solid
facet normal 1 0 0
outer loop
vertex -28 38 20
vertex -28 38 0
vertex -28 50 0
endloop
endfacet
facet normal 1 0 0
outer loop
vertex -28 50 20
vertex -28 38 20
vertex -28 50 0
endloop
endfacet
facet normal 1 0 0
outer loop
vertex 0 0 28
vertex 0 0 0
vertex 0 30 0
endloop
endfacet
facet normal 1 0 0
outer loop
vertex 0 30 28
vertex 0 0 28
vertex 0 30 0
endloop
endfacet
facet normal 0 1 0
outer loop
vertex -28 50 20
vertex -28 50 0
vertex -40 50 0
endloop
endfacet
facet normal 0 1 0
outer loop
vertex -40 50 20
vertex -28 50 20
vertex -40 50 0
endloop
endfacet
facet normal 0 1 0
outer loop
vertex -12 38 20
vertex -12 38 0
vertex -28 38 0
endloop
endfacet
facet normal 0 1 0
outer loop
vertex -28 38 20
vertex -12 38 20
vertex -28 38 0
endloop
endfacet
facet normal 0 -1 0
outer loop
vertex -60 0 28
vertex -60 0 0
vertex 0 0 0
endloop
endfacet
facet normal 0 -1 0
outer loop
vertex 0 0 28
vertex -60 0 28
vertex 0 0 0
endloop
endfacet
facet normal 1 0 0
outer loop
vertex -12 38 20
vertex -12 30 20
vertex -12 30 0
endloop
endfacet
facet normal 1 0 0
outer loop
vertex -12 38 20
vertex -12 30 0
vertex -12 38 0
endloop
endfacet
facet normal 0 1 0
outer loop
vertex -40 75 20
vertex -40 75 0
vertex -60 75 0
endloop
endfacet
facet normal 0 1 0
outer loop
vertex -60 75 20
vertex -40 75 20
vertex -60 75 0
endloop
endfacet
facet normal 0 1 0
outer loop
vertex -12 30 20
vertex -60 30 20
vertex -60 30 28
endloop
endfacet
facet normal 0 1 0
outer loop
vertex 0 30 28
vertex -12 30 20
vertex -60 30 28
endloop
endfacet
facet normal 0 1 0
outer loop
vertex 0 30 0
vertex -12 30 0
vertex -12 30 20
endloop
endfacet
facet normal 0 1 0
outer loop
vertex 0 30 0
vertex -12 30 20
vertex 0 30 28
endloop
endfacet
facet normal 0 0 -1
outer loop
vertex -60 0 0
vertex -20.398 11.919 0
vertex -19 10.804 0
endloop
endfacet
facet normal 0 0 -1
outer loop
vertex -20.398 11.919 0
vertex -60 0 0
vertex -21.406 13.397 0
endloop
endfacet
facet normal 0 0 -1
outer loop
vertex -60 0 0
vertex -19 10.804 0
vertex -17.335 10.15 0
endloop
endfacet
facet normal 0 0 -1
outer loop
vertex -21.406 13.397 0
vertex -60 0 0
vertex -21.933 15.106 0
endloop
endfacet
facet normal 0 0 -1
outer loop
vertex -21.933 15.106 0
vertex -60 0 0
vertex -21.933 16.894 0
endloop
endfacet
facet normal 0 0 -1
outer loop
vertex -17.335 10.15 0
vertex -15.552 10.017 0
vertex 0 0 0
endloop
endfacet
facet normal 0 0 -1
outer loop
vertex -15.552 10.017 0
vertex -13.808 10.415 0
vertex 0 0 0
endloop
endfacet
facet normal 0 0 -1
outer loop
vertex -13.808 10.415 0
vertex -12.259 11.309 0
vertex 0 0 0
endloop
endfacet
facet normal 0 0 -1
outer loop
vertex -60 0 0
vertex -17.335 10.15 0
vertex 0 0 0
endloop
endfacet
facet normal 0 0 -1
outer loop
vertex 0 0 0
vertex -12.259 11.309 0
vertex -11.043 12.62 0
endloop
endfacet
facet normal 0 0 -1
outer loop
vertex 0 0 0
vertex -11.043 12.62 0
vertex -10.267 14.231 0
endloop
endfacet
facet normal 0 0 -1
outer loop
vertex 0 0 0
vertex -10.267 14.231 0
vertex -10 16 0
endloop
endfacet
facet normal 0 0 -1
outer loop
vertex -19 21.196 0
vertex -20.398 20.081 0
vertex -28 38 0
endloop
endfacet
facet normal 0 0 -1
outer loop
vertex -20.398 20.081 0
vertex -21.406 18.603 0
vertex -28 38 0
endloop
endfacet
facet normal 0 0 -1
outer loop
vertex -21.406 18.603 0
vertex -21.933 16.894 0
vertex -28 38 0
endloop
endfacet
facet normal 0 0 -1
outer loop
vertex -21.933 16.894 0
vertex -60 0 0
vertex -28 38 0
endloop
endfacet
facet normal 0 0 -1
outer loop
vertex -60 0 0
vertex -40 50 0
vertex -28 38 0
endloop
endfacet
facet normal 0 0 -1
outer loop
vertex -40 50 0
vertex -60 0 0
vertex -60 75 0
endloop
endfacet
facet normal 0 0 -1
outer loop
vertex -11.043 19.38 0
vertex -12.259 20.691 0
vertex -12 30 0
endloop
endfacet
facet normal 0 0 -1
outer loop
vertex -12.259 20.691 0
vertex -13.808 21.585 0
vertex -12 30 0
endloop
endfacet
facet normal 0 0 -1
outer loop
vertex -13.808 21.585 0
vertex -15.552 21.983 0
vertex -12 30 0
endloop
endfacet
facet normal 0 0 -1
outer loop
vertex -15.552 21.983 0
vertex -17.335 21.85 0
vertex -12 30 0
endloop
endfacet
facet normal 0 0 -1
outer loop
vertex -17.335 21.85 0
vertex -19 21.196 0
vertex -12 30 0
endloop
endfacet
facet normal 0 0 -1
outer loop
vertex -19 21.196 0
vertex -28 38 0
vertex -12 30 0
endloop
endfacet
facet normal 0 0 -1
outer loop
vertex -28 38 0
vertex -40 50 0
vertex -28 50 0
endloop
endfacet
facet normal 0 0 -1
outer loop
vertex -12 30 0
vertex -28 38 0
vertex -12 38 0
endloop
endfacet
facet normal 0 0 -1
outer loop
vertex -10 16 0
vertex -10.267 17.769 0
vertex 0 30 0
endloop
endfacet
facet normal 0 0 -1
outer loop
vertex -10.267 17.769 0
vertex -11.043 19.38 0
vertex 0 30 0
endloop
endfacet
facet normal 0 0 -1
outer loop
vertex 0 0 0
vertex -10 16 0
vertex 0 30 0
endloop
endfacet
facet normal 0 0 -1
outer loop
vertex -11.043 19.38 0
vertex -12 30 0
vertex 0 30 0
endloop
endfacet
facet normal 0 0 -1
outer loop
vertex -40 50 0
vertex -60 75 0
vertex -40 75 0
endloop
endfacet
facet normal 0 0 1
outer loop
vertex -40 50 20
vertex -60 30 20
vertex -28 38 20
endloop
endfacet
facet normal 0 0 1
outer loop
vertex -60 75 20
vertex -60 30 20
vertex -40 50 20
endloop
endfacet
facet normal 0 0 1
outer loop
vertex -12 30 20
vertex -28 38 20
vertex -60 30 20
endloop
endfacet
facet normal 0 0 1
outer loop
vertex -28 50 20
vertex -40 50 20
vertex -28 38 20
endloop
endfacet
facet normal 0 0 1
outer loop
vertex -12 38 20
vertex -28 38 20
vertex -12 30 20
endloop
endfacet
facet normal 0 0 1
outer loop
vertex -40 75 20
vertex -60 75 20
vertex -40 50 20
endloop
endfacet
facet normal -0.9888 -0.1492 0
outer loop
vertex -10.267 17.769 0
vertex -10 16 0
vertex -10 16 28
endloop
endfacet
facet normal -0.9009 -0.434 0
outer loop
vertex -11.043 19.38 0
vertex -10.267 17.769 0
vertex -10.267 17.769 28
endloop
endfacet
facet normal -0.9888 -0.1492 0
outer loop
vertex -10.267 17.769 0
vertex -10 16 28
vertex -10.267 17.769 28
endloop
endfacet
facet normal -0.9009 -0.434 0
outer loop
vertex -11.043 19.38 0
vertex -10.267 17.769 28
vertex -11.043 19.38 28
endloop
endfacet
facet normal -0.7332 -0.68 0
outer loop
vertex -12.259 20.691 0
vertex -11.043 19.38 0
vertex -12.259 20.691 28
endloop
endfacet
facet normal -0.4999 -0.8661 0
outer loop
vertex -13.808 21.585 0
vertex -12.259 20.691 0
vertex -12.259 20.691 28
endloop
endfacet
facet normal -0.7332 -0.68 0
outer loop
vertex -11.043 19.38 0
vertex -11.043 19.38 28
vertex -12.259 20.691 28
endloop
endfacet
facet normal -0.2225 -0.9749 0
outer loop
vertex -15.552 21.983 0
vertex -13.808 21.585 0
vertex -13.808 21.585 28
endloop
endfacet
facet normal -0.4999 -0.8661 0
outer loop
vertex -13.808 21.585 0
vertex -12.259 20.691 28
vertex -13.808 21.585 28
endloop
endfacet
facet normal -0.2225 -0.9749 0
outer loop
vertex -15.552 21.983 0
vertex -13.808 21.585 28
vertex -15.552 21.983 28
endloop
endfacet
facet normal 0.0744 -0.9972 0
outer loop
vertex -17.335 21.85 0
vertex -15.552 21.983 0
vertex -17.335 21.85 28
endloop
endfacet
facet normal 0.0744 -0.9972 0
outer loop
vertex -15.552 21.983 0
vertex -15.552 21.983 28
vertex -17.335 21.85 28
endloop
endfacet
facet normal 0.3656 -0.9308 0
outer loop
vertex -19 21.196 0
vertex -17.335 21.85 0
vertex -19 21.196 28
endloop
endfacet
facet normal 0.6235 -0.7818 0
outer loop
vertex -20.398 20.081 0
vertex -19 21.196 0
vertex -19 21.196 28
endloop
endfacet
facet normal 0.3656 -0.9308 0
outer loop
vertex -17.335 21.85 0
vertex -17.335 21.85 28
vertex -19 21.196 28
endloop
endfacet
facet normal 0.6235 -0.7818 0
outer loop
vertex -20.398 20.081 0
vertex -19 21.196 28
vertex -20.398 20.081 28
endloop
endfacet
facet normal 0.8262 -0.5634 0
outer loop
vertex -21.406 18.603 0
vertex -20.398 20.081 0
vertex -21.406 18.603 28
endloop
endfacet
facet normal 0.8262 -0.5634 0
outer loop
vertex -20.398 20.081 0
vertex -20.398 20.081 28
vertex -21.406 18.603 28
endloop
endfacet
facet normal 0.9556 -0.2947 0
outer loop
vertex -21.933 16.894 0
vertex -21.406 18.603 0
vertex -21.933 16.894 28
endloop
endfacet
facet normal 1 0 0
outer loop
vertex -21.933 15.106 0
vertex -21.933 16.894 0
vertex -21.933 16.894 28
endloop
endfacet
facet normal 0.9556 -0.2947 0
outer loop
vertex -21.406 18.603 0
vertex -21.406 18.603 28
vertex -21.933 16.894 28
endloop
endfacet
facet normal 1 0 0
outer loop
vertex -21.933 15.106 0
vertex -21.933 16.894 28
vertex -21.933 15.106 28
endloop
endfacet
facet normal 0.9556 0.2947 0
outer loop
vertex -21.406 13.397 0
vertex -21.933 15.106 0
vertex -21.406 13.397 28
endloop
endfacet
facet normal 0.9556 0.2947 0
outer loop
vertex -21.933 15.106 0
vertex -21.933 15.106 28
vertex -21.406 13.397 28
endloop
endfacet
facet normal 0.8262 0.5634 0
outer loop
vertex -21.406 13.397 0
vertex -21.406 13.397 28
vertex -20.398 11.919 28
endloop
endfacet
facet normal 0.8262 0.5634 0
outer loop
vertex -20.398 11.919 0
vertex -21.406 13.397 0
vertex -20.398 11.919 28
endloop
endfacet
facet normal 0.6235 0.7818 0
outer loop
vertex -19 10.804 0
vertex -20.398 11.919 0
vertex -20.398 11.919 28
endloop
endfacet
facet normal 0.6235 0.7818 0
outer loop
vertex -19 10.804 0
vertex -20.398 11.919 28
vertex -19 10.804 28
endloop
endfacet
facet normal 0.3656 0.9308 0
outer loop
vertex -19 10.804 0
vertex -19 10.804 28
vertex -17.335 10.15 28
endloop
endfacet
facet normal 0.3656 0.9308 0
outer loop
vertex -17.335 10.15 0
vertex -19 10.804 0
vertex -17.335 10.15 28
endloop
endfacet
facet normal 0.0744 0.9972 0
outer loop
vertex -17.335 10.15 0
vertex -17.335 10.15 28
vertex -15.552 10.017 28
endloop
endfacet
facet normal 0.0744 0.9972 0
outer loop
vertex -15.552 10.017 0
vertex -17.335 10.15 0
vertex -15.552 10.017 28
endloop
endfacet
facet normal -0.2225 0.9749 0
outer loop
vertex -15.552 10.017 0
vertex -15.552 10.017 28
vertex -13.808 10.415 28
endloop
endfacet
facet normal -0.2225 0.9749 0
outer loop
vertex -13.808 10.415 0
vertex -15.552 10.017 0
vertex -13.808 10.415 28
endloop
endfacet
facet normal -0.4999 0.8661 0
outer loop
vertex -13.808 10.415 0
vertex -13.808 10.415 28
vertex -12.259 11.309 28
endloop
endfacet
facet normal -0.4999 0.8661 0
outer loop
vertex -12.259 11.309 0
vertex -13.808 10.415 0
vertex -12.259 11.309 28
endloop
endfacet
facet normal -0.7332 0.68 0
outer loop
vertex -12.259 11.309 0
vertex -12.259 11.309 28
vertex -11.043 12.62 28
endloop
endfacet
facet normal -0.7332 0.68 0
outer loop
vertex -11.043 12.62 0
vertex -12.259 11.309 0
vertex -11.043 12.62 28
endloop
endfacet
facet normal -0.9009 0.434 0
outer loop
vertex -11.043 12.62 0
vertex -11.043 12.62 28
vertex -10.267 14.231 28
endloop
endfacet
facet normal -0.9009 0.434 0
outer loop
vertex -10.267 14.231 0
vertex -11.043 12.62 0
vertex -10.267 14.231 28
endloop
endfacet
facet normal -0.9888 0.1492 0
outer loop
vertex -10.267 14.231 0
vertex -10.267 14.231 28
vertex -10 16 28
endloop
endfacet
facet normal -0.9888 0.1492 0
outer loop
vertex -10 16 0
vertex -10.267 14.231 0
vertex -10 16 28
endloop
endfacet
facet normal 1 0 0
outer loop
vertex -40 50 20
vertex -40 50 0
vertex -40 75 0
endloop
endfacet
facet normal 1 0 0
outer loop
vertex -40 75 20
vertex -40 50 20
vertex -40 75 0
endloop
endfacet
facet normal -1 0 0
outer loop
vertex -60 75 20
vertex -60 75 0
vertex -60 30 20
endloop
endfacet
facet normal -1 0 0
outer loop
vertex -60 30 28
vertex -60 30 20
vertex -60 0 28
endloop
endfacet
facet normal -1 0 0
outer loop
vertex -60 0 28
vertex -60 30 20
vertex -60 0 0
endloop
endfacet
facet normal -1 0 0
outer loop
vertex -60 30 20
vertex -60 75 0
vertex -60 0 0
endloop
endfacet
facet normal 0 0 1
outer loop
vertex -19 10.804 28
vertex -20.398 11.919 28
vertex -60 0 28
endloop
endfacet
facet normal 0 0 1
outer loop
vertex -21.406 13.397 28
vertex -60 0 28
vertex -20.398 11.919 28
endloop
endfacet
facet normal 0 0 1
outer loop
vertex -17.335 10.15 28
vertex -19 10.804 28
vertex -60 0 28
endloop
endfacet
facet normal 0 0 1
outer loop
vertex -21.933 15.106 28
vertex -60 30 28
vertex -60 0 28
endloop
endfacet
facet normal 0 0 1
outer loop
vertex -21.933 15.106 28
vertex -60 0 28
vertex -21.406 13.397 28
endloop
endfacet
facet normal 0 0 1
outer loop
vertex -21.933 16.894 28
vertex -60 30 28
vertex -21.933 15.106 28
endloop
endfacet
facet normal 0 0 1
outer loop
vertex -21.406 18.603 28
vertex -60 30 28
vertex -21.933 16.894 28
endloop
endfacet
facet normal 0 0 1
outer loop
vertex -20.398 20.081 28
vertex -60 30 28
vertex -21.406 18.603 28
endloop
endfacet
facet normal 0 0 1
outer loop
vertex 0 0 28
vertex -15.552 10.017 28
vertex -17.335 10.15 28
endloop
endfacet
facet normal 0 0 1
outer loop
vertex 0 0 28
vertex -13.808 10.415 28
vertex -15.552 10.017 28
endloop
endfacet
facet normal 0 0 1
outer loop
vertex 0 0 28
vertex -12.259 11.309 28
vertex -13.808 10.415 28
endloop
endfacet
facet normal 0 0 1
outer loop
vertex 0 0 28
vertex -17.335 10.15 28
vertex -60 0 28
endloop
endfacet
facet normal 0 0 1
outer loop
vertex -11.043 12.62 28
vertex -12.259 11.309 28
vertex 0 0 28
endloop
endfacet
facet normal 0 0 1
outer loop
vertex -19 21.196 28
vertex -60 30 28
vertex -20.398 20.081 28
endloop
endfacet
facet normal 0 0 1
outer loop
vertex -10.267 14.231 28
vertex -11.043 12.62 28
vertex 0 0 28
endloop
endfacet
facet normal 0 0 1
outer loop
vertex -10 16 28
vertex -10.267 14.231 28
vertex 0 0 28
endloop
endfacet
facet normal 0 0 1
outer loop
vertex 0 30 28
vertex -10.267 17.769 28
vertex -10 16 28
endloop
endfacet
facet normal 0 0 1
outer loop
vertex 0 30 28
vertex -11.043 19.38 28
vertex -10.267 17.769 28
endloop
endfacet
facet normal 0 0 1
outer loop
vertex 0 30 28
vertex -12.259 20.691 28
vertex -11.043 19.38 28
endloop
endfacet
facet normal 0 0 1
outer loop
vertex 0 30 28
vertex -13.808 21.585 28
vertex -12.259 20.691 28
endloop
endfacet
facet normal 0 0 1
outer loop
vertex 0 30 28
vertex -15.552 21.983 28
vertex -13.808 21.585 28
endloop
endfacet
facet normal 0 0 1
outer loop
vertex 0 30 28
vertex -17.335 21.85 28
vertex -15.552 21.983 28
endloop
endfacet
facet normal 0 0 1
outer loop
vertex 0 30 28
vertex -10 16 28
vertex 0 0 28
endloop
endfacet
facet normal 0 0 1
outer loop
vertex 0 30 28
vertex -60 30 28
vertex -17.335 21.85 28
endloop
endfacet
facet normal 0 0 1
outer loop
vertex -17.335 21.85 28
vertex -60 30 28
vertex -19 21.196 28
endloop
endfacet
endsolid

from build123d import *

# Parameters (mm, degrees)
CROQUIS2_W              = 60
CROQUIS2_H              = 30
SALIENTE_EXTRUIR1_DEPTH = 28
SALIENTE_EXTRUIR2_DEPTH = 20
CROQUIS5_R              = 6
CORTAR_EXTRUIR1_DEPTH   = 29


with BuildPart() as part:
    # Croquis2 → Saliente-Extruir1 (new body)
    with BuildSketch(Plane.XY):
        with Locations((-30, 15)):
            Rectangle(CROQUIS2_W, CROQUIS2_H)
    extrude(amount=SALIENTE_EXTRUIR1_DEPTH)

    # Croquis2_4 → Saliente-Extruir2 (add)
    with BuildSketch(Plane.XY):
        Polygon((-60, 75), (-60, 30), (-12, 30), (-12, 38), (-28, 38), (-28, 50), (-40, 50), (-40, 75), align=None)
    extrude(amount=SALIENTE_EXTRUIR2_DEPTH)

    # Croquis5 → Cortar-Extruir1 (cut, through all)
    with BuildSketch(Plane.XY.offset(28)):
        with Locations((-16, 16)):
            Circle(CROQUIS5_R)
    extrude(amount=-CORTAR_EXTRUIR1_DEPTH, mode=Mode.SUBTRACT)


solid = part.part
